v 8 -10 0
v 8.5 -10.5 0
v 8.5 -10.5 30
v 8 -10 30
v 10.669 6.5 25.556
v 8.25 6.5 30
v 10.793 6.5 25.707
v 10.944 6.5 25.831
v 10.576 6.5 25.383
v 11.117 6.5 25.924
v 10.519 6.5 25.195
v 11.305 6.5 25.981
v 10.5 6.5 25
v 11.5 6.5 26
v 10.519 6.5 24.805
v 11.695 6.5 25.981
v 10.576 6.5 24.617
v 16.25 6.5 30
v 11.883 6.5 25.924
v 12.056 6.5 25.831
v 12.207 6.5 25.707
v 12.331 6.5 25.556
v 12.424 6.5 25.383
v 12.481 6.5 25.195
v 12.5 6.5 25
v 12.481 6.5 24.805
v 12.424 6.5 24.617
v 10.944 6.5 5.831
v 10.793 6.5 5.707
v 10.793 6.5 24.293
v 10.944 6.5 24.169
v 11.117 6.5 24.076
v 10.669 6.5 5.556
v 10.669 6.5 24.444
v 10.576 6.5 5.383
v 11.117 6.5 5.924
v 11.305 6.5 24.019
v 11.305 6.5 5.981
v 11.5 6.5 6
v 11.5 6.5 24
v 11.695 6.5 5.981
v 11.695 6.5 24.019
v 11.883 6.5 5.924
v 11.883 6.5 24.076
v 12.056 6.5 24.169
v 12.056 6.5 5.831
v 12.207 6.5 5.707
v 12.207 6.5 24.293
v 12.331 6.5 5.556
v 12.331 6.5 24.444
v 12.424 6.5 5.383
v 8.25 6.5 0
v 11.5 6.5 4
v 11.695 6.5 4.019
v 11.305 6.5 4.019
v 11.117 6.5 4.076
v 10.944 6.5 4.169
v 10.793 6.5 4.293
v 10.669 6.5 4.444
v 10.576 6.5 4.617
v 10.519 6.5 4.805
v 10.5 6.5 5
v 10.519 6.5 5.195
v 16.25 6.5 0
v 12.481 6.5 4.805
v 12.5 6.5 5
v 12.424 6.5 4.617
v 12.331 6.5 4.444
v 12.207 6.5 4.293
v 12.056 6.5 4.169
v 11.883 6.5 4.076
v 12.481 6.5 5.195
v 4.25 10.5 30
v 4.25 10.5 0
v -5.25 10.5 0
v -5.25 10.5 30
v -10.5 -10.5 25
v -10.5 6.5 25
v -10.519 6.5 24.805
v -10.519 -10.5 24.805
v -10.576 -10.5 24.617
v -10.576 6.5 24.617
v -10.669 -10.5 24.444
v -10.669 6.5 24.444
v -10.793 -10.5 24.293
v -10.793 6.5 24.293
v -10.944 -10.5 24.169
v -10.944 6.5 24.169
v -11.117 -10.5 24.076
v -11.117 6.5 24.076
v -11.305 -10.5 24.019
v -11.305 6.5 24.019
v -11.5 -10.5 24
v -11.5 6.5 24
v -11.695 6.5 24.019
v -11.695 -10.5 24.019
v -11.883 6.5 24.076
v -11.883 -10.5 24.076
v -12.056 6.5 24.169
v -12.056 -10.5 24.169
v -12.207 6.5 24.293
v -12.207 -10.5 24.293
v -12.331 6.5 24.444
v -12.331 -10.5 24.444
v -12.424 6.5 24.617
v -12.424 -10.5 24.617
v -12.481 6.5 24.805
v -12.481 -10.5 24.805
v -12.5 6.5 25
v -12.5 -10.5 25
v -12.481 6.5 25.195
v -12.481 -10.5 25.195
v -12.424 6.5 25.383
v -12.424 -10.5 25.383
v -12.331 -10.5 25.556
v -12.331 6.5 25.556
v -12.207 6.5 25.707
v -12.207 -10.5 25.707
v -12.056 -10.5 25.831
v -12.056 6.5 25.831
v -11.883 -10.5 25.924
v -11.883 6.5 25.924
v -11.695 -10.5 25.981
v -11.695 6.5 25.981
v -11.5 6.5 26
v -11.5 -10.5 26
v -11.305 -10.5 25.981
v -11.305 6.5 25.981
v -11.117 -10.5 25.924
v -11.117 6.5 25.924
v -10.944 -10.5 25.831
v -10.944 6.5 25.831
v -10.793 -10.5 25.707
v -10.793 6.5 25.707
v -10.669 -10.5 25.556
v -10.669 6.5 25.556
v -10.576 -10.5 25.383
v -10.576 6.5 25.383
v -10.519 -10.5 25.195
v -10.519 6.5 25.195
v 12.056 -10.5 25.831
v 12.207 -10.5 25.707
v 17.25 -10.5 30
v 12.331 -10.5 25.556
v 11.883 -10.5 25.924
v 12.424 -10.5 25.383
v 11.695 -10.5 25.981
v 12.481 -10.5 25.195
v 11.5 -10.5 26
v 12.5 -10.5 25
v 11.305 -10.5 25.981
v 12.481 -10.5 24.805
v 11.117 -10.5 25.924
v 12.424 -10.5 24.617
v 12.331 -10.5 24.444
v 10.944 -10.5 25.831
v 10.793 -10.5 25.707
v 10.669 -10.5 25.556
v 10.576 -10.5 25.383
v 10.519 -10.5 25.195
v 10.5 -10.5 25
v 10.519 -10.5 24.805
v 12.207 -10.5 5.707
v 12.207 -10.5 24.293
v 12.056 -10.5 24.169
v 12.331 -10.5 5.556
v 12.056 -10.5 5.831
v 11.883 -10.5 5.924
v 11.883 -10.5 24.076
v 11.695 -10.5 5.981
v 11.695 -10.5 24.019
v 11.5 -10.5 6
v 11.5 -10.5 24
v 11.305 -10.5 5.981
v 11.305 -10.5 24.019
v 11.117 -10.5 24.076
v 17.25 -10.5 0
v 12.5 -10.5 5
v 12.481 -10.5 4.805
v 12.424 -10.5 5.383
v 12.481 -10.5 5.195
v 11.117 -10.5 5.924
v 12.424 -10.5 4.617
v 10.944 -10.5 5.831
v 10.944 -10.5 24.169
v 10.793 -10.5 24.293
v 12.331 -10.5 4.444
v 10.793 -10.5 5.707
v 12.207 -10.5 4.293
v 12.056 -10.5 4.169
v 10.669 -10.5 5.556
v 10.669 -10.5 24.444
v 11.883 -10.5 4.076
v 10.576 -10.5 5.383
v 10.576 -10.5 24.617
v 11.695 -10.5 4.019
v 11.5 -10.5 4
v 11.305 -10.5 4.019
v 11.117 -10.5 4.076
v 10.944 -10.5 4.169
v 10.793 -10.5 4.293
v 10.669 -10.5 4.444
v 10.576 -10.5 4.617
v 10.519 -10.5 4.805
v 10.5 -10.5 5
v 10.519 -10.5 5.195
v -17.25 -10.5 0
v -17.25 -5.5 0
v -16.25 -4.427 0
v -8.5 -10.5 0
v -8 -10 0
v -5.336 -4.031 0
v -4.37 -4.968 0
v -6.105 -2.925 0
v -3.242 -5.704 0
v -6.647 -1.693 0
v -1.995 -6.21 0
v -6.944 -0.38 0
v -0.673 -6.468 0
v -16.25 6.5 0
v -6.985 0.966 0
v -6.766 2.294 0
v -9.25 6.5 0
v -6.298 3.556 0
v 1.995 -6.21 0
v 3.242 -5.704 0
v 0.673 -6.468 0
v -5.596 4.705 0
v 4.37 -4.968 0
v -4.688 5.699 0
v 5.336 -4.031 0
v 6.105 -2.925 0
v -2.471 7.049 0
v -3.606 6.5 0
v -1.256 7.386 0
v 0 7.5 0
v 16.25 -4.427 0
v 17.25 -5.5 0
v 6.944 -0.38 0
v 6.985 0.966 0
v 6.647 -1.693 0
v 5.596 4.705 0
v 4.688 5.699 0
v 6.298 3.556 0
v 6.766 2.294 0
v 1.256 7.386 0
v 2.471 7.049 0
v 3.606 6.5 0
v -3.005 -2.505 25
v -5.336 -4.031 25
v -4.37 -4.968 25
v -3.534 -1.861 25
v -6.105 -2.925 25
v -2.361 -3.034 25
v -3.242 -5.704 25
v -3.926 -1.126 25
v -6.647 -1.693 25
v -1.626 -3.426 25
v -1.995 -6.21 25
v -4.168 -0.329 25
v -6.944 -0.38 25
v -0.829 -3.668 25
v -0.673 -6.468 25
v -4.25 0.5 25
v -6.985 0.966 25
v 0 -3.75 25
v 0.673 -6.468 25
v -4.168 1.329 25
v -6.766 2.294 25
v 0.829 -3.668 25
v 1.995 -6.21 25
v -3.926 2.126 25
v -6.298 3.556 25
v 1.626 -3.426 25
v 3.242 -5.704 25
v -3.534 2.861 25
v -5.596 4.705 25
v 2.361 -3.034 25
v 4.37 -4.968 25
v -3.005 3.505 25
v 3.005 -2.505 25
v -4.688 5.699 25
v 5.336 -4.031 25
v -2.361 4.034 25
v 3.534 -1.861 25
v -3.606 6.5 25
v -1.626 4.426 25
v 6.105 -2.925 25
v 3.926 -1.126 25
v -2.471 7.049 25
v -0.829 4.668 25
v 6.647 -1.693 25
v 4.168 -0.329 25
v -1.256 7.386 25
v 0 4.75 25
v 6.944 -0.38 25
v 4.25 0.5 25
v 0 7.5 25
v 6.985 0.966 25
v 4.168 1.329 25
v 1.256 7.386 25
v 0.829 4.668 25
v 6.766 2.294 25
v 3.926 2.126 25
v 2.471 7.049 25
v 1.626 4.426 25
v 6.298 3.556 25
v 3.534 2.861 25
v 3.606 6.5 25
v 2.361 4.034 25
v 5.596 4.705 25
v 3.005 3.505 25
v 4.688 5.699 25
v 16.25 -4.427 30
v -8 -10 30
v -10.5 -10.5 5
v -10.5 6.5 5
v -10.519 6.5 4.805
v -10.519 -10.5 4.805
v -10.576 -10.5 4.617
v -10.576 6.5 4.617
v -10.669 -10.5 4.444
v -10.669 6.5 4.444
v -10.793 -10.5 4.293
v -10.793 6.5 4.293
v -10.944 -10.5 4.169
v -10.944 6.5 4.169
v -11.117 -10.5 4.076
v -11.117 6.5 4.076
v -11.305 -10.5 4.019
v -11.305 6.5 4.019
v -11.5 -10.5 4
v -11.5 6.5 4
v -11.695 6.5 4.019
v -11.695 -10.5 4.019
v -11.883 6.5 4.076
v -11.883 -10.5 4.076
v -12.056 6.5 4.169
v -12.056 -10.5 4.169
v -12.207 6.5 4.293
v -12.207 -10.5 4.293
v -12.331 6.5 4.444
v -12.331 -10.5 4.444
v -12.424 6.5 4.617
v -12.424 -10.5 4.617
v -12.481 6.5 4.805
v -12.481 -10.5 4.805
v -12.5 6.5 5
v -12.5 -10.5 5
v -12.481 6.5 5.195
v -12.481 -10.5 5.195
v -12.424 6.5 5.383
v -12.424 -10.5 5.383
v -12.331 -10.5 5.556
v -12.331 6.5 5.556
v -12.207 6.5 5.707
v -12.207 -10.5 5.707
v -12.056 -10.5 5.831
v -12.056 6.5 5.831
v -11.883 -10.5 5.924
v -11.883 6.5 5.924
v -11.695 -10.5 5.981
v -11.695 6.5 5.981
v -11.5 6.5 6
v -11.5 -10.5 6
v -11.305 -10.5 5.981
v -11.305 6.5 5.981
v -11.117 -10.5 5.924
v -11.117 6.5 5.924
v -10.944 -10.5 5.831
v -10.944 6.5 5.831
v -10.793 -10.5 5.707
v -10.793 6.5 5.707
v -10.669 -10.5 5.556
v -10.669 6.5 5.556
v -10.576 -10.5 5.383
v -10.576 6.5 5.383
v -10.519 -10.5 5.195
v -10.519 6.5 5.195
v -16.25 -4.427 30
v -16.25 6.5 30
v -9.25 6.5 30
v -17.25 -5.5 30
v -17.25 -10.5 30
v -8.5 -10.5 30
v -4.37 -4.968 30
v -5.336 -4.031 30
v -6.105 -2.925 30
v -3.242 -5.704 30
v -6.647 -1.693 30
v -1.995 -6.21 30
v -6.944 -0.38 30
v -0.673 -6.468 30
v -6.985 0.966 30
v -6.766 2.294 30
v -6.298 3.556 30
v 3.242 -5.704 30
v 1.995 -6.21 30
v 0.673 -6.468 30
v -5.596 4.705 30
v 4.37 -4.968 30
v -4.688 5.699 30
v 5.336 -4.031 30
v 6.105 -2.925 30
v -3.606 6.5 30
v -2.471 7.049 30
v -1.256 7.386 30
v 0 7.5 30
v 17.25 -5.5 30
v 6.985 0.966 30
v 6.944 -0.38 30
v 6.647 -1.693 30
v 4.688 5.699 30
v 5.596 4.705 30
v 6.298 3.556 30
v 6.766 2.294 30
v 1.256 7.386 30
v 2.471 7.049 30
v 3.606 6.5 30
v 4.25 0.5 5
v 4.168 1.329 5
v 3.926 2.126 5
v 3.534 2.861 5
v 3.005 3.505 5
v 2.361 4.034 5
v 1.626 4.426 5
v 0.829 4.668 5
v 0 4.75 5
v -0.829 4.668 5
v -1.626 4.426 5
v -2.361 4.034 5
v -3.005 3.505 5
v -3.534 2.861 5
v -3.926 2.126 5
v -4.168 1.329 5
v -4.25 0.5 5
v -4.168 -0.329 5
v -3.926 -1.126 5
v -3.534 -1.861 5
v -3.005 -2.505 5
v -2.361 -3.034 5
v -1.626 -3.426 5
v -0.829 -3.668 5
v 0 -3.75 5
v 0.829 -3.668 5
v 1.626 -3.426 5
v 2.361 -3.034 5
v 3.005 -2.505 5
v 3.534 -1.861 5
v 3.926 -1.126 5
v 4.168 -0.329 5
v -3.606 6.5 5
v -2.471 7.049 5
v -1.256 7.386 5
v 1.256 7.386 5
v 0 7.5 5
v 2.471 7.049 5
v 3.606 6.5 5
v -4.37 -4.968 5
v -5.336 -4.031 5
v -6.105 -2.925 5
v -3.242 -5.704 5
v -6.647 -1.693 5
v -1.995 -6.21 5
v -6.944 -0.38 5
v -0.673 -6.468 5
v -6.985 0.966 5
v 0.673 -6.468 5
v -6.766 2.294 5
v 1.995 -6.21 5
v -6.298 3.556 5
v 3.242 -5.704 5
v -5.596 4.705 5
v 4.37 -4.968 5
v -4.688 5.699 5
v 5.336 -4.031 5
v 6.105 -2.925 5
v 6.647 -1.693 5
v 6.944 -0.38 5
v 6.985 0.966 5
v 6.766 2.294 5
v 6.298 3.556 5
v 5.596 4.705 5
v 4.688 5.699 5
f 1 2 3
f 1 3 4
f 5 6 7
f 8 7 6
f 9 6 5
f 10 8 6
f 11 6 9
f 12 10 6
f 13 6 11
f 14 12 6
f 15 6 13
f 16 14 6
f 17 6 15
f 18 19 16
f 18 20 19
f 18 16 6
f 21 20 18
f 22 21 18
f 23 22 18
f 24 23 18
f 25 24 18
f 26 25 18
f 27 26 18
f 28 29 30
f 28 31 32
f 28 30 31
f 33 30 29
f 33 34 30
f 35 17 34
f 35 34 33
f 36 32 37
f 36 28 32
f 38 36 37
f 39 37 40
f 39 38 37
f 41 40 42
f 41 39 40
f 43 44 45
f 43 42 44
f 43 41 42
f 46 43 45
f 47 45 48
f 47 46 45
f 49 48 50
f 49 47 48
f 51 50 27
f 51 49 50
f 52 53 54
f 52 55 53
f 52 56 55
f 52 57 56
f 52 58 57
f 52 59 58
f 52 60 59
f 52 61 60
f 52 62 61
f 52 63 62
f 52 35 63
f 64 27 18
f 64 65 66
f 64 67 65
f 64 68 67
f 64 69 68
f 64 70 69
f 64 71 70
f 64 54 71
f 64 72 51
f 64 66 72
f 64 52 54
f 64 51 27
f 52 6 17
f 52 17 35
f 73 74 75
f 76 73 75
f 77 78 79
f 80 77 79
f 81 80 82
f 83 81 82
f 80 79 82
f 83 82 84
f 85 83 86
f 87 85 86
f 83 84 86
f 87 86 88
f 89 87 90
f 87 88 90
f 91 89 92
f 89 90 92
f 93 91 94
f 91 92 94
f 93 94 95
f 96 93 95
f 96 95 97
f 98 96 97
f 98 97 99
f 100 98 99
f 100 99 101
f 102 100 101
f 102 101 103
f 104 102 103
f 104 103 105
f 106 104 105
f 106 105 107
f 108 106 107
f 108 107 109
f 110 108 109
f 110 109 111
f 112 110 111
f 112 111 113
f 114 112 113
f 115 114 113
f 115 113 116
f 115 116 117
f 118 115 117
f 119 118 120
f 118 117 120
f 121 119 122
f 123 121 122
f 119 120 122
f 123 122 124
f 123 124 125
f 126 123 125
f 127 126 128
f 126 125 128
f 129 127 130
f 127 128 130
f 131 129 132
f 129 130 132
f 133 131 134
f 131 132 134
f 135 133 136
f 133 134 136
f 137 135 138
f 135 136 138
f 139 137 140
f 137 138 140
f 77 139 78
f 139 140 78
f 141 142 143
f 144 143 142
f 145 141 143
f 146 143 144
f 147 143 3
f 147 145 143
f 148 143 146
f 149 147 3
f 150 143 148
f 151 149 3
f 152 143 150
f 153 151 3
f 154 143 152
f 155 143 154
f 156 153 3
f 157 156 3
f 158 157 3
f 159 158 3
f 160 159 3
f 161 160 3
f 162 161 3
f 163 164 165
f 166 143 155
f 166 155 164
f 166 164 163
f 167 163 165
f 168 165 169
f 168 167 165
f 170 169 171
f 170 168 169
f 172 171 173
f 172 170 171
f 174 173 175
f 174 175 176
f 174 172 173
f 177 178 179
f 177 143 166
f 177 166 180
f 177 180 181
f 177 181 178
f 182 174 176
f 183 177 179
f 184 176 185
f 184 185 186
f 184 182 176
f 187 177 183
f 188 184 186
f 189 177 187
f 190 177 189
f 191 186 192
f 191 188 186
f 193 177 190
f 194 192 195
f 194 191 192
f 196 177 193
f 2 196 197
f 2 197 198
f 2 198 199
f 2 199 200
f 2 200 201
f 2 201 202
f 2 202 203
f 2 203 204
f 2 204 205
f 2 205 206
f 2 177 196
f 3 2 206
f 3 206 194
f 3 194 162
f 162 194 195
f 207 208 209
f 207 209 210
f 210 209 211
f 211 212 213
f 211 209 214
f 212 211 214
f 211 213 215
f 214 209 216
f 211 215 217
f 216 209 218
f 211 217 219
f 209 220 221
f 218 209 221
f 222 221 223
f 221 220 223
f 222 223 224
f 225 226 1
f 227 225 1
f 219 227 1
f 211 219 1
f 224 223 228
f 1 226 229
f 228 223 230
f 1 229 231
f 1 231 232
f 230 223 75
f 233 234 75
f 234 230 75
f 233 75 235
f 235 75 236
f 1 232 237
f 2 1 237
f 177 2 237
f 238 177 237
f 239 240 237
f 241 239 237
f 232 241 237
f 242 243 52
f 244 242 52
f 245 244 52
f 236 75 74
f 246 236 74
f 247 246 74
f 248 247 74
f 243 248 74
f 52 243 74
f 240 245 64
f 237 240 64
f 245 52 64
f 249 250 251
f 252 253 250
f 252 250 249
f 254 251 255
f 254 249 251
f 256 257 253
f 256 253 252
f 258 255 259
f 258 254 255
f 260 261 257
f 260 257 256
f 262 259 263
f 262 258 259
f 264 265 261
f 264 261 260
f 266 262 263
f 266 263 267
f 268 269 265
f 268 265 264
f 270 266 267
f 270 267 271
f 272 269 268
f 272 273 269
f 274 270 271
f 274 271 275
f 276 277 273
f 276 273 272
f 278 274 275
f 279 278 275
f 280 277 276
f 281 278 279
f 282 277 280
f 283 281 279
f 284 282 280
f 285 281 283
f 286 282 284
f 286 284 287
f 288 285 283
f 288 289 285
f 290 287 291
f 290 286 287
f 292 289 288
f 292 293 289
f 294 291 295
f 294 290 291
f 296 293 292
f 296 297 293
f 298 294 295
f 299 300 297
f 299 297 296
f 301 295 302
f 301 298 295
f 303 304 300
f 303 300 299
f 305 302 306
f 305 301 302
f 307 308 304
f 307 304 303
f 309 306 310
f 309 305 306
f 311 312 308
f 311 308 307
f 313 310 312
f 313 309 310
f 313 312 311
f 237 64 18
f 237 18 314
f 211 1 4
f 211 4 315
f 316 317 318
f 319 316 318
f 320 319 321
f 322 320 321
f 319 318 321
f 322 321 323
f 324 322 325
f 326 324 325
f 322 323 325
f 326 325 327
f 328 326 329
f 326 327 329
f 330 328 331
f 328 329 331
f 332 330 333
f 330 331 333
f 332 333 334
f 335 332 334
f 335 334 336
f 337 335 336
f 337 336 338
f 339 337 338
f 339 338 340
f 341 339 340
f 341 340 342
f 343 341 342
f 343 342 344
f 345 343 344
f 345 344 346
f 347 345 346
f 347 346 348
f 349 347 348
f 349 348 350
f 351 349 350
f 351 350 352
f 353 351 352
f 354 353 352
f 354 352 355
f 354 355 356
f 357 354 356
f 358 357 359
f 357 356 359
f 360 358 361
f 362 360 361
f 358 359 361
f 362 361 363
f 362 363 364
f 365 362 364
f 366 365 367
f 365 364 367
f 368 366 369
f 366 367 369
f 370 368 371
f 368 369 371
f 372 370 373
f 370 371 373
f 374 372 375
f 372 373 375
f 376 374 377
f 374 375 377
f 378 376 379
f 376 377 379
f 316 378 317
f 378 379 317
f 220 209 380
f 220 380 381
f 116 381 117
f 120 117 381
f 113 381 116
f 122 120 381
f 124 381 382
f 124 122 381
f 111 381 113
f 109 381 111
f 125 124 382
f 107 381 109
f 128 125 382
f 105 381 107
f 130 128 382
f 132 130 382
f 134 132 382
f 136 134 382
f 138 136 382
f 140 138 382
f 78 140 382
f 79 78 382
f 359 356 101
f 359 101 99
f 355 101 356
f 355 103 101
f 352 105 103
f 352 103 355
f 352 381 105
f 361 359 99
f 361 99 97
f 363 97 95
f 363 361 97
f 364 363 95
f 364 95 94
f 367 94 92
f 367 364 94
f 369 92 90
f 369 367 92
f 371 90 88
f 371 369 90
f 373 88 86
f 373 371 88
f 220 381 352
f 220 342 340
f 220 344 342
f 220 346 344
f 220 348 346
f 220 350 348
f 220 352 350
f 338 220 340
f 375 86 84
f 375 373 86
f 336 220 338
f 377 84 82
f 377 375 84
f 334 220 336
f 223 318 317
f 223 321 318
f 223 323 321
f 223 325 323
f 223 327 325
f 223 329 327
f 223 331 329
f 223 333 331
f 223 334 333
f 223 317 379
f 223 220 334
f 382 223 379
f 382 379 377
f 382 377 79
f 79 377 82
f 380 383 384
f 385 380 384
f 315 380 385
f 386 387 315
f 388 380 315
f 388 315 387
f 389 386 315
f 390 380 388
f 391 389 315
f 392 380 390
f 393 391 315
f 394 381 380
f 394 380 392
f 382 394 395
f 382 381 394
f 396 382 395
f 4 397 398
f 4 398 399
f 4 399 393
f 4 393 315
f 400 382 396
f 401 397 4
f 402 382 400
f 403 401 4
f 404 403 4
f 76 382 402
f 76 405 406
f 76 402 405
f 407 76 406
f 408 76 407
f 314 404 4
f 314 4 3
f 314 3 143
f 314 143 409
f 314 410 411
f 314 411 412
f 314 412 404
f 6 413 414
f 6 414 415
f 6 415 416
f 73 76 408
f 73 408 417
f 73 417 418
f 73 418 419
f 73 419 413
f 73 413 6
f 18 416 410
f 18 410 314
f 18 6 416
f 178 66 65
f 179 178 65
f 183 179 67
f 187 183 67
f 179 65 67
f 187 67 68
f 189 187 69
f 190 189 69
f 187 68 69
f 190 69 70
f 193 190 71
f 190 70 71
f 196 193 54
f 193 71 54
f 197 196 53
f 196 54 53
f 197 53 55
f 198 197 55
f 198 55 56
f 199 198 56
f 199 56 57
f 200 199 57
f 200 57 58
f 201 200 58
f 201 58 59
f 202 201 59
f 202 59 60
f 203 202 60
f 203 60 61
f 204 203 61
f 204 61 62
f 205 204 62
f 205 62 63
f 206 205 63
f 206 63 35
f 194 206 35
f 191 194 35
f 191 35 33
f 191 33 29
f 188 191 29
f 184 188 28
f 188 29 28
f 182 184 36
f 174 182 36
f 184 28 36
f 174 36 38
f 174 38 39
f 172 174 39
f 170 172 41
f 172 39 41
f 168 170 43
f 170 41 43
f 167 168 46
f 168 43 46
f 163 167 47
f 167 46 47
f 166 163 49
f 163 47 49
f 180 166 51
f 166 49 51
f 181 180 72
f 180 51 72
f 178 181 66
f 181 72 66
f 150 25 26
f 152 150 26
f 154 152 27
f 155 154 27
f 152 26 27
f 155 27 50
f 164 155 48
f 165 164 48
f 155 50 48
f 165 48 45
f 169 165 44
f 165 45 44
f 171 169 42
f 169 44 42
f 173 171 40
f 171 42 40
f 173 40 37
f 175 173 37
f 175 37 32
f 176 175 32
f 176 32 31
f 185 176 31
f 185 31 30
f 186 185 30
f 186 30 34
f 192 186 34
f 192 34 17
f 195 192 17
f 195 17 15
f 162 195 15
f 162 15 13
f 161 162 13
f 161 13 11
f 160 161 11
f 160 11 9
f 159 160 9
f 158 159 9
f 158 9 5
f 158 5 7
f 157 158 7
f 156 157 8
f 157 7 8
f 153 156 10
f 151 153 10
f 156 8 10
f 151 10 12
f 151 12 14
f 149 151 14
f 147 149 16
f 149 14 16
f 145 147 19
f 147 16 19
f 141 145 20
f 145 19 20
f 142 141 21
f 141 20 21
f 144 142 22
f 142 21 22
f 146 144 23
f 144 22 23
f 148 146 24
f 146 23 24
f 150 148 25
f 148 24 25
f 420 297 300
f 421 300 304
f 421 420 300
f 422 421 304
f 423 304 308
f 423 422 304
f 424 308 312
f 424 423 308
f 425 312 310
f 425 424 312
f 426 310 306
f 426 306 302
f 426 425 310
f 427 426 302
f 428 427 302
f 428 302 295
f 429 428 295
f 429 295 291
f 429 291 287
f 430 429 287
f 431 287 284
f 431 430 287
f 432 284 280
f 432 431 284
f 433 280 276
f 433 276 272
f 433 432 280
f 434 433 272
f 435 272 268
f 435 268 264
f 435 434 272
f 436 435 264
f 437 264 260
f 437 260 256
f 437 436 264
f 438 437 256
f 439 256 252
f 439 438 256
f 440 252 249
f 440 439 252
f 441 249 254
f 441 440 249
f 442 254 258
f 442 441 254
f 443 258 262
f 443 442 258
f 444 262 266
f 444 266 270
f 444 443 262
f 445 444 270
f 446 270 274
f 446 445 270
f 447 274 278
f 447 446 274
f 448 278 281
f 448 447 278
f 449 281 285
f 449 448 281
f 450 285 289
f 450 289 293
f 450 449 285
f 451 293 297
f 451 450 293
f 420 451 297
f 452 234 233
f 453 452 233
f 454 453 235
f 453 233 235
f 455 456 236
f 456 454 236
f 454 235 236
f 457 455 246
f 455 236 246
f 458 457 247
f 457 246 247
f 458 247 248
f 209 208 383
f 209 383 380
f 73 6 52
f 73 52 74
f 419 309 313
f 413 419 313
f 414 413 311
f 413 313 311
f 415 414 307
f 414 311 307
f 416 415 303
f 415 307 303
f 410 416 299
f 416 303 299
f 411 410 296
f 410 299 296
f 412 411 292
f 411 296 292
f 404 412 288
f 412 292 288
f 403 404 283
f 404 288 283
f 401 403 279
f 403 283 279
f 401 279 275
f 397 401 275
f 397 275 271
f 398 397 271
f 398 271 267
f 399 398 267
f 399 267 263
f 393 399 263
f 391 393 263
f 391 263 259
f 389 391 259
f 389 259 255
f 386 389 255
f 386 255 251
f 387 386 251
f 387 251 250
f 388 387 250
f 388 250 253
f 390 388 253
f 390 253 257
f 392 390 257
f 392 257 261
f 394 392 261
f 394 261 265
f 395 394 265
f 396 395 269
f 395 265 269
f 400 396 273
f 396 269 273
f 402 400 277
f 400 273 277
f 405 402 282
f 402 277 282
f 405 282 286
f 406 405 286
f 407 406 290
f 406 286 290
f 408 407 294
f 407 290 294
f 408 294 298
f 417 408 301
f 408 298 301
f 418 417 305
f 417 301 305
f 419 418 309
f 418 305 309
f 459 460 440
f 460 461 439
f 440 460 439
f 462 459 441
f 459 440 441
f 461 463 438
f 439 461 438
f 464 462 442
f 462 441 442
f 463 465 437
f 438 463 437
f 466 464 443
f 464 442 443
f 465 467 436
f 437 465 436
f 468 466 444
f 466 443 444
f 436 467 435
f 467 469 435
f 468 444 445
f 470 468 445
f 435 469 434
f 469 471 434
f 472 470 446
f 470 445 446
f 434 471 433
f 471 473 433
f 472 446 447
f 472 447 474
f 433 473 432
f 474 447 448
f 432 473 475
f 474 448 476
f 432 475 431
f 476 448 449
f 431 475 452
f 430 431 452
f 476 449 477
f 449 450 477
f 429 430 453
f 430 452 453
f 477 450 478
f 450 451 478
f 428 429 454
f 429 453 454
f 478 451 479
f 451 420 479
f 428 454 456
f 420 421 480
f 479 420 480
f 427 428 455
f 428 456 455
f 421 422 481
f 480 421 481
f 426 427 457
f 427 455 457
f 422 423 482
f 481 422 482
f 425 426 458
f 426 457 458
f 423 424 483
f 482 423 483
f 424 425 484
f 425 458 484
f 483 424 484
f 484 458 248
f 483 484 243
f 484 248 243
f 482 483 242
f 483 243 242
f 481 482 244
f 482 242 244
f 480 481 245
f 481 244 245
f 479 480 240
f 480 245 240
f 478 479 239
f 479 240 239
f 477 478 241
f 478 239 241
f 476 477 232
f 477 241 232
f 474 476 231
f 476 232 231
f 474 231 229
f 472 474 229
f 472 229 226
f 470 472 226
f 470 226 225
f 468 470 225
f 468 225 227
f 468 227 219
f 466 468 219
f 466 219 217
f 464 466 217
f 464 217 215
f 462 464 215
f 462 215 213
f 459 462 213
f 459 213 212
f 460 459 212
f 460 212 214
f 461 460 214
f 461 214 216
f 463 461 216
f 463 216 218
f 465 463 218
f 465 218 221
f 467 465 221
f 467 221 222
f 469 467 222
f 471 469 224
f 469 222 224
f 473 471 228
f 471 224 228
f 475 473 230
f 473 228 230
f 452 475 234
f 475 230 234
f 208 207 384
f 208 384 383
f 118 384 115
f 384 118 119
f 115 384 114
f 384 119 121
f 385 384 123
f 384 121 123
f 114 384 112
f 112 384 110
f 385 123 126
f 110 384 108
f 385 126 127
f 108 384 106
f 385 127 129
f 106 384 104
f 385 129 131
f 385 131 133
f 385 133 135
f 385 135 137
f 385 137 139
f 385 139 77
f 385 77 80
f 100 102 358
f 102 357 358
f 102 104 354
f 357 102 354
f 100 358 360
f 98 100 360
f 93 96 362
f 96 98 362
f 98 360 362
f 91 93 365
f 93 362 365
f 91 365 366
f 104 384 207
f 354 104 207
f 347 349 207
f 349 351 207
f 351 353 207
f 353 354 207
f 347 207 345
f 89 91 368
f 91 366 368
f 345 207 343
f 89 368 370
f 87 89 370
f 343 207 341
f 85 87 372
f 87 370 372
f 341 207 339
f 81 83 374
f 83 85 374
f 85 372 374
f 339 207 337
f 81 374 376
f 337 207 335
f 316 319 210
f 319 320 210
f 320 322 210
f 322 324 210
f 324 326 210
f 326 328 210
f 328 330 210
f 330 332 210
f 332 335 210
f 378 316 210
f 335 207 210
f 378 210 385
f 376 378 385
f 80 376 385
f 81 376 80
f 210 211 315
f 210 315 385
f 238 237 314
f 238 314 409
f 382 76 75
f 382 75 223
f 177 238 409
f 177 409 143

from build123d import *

# Parameters (mm, degrees)
SKETCH1_R             = 7
BOSS_EXTRUDE1_DEPTH   = 30
BOSS_EXTRUDE2_START   = -25
SKETCH3_R             = 7
SKETCH3_R_2           = 4.25
BOSS_EXTRUDE2_DEPTH   = 20
F_2_0MM_DOWEL_HOLE1_D = 2


with BuildPart() as part:
    # Sketch1 → Boss-Extrude1 (new body)
    # profile 1 of 2: a face of its own
    with BuildSketch(Plane.XY):
        Polygon((-16.25, 6.5), (16.25, 6.5), (16.25, -4.427166083), (17.25, -5.5), (17.25, -10.5), (8.5, -10.5), (8, -10), (-8, -10), (-8.5, -10.5), (-9, -10.5), (-17.25, -10.5), (-17.25, -5.5), (-16.25, -4.427166083), align=None)
        with Locations((0, 0.5)):
            Circle(SKETCH1_R, mode=Mode.SUBTRACT)
    # profile 2 of 2: a face of its own
    with BuildSketch(Plane.XY):
        with BuildLine():
            Line((3.605551275, 6.5), (8.25, 6.5))
            Line((8.25, 6.5), (4.25, 10.5))
            Line((4.25, 10.5), (-5.25, 10.5))
            Line((-5.25, 10.5), (-9.25, 6.5))
            Line((-9.25, 6.5), (-3.605551275, 6.5))
            ThreePointArc((-3.605551275, 6.5), (0, 7.5), (3.605551275, 6.5))
        make_face()
    extrude(amount=BOSS_EXTRUDE1_DEPTH)

    # Sketch3 → Boss-Extrude2 (add)
    with BuildSketch(Plane.XY.offset(30).offset(BOSS_EXTRUDE2_START)):
        with Locations((0, 0.5)):
            Circle(SKETCH3_R)
        with Locations((0, 0.5)):
            Circle(SKETCH3_R_2, mode=Mode.SUBTRACT)
    extrude(amount=BOSS_EXTRUDE2_DEPTH)

    # Ø2.0mm Dowel Hole1 (through all)
    with Locations(Plane(origin=(0, -10.5, 0), x_dir=(-1, 0, 0), z_dir=(0, -1, 0))):
        with Locations((11.5, -25), (11.5, -5), (-11.5, -5), (-11.5, -25)):
            Hole(F_2_0MM_DOWEL_HOLE1_D / 2)


solid = part.part
